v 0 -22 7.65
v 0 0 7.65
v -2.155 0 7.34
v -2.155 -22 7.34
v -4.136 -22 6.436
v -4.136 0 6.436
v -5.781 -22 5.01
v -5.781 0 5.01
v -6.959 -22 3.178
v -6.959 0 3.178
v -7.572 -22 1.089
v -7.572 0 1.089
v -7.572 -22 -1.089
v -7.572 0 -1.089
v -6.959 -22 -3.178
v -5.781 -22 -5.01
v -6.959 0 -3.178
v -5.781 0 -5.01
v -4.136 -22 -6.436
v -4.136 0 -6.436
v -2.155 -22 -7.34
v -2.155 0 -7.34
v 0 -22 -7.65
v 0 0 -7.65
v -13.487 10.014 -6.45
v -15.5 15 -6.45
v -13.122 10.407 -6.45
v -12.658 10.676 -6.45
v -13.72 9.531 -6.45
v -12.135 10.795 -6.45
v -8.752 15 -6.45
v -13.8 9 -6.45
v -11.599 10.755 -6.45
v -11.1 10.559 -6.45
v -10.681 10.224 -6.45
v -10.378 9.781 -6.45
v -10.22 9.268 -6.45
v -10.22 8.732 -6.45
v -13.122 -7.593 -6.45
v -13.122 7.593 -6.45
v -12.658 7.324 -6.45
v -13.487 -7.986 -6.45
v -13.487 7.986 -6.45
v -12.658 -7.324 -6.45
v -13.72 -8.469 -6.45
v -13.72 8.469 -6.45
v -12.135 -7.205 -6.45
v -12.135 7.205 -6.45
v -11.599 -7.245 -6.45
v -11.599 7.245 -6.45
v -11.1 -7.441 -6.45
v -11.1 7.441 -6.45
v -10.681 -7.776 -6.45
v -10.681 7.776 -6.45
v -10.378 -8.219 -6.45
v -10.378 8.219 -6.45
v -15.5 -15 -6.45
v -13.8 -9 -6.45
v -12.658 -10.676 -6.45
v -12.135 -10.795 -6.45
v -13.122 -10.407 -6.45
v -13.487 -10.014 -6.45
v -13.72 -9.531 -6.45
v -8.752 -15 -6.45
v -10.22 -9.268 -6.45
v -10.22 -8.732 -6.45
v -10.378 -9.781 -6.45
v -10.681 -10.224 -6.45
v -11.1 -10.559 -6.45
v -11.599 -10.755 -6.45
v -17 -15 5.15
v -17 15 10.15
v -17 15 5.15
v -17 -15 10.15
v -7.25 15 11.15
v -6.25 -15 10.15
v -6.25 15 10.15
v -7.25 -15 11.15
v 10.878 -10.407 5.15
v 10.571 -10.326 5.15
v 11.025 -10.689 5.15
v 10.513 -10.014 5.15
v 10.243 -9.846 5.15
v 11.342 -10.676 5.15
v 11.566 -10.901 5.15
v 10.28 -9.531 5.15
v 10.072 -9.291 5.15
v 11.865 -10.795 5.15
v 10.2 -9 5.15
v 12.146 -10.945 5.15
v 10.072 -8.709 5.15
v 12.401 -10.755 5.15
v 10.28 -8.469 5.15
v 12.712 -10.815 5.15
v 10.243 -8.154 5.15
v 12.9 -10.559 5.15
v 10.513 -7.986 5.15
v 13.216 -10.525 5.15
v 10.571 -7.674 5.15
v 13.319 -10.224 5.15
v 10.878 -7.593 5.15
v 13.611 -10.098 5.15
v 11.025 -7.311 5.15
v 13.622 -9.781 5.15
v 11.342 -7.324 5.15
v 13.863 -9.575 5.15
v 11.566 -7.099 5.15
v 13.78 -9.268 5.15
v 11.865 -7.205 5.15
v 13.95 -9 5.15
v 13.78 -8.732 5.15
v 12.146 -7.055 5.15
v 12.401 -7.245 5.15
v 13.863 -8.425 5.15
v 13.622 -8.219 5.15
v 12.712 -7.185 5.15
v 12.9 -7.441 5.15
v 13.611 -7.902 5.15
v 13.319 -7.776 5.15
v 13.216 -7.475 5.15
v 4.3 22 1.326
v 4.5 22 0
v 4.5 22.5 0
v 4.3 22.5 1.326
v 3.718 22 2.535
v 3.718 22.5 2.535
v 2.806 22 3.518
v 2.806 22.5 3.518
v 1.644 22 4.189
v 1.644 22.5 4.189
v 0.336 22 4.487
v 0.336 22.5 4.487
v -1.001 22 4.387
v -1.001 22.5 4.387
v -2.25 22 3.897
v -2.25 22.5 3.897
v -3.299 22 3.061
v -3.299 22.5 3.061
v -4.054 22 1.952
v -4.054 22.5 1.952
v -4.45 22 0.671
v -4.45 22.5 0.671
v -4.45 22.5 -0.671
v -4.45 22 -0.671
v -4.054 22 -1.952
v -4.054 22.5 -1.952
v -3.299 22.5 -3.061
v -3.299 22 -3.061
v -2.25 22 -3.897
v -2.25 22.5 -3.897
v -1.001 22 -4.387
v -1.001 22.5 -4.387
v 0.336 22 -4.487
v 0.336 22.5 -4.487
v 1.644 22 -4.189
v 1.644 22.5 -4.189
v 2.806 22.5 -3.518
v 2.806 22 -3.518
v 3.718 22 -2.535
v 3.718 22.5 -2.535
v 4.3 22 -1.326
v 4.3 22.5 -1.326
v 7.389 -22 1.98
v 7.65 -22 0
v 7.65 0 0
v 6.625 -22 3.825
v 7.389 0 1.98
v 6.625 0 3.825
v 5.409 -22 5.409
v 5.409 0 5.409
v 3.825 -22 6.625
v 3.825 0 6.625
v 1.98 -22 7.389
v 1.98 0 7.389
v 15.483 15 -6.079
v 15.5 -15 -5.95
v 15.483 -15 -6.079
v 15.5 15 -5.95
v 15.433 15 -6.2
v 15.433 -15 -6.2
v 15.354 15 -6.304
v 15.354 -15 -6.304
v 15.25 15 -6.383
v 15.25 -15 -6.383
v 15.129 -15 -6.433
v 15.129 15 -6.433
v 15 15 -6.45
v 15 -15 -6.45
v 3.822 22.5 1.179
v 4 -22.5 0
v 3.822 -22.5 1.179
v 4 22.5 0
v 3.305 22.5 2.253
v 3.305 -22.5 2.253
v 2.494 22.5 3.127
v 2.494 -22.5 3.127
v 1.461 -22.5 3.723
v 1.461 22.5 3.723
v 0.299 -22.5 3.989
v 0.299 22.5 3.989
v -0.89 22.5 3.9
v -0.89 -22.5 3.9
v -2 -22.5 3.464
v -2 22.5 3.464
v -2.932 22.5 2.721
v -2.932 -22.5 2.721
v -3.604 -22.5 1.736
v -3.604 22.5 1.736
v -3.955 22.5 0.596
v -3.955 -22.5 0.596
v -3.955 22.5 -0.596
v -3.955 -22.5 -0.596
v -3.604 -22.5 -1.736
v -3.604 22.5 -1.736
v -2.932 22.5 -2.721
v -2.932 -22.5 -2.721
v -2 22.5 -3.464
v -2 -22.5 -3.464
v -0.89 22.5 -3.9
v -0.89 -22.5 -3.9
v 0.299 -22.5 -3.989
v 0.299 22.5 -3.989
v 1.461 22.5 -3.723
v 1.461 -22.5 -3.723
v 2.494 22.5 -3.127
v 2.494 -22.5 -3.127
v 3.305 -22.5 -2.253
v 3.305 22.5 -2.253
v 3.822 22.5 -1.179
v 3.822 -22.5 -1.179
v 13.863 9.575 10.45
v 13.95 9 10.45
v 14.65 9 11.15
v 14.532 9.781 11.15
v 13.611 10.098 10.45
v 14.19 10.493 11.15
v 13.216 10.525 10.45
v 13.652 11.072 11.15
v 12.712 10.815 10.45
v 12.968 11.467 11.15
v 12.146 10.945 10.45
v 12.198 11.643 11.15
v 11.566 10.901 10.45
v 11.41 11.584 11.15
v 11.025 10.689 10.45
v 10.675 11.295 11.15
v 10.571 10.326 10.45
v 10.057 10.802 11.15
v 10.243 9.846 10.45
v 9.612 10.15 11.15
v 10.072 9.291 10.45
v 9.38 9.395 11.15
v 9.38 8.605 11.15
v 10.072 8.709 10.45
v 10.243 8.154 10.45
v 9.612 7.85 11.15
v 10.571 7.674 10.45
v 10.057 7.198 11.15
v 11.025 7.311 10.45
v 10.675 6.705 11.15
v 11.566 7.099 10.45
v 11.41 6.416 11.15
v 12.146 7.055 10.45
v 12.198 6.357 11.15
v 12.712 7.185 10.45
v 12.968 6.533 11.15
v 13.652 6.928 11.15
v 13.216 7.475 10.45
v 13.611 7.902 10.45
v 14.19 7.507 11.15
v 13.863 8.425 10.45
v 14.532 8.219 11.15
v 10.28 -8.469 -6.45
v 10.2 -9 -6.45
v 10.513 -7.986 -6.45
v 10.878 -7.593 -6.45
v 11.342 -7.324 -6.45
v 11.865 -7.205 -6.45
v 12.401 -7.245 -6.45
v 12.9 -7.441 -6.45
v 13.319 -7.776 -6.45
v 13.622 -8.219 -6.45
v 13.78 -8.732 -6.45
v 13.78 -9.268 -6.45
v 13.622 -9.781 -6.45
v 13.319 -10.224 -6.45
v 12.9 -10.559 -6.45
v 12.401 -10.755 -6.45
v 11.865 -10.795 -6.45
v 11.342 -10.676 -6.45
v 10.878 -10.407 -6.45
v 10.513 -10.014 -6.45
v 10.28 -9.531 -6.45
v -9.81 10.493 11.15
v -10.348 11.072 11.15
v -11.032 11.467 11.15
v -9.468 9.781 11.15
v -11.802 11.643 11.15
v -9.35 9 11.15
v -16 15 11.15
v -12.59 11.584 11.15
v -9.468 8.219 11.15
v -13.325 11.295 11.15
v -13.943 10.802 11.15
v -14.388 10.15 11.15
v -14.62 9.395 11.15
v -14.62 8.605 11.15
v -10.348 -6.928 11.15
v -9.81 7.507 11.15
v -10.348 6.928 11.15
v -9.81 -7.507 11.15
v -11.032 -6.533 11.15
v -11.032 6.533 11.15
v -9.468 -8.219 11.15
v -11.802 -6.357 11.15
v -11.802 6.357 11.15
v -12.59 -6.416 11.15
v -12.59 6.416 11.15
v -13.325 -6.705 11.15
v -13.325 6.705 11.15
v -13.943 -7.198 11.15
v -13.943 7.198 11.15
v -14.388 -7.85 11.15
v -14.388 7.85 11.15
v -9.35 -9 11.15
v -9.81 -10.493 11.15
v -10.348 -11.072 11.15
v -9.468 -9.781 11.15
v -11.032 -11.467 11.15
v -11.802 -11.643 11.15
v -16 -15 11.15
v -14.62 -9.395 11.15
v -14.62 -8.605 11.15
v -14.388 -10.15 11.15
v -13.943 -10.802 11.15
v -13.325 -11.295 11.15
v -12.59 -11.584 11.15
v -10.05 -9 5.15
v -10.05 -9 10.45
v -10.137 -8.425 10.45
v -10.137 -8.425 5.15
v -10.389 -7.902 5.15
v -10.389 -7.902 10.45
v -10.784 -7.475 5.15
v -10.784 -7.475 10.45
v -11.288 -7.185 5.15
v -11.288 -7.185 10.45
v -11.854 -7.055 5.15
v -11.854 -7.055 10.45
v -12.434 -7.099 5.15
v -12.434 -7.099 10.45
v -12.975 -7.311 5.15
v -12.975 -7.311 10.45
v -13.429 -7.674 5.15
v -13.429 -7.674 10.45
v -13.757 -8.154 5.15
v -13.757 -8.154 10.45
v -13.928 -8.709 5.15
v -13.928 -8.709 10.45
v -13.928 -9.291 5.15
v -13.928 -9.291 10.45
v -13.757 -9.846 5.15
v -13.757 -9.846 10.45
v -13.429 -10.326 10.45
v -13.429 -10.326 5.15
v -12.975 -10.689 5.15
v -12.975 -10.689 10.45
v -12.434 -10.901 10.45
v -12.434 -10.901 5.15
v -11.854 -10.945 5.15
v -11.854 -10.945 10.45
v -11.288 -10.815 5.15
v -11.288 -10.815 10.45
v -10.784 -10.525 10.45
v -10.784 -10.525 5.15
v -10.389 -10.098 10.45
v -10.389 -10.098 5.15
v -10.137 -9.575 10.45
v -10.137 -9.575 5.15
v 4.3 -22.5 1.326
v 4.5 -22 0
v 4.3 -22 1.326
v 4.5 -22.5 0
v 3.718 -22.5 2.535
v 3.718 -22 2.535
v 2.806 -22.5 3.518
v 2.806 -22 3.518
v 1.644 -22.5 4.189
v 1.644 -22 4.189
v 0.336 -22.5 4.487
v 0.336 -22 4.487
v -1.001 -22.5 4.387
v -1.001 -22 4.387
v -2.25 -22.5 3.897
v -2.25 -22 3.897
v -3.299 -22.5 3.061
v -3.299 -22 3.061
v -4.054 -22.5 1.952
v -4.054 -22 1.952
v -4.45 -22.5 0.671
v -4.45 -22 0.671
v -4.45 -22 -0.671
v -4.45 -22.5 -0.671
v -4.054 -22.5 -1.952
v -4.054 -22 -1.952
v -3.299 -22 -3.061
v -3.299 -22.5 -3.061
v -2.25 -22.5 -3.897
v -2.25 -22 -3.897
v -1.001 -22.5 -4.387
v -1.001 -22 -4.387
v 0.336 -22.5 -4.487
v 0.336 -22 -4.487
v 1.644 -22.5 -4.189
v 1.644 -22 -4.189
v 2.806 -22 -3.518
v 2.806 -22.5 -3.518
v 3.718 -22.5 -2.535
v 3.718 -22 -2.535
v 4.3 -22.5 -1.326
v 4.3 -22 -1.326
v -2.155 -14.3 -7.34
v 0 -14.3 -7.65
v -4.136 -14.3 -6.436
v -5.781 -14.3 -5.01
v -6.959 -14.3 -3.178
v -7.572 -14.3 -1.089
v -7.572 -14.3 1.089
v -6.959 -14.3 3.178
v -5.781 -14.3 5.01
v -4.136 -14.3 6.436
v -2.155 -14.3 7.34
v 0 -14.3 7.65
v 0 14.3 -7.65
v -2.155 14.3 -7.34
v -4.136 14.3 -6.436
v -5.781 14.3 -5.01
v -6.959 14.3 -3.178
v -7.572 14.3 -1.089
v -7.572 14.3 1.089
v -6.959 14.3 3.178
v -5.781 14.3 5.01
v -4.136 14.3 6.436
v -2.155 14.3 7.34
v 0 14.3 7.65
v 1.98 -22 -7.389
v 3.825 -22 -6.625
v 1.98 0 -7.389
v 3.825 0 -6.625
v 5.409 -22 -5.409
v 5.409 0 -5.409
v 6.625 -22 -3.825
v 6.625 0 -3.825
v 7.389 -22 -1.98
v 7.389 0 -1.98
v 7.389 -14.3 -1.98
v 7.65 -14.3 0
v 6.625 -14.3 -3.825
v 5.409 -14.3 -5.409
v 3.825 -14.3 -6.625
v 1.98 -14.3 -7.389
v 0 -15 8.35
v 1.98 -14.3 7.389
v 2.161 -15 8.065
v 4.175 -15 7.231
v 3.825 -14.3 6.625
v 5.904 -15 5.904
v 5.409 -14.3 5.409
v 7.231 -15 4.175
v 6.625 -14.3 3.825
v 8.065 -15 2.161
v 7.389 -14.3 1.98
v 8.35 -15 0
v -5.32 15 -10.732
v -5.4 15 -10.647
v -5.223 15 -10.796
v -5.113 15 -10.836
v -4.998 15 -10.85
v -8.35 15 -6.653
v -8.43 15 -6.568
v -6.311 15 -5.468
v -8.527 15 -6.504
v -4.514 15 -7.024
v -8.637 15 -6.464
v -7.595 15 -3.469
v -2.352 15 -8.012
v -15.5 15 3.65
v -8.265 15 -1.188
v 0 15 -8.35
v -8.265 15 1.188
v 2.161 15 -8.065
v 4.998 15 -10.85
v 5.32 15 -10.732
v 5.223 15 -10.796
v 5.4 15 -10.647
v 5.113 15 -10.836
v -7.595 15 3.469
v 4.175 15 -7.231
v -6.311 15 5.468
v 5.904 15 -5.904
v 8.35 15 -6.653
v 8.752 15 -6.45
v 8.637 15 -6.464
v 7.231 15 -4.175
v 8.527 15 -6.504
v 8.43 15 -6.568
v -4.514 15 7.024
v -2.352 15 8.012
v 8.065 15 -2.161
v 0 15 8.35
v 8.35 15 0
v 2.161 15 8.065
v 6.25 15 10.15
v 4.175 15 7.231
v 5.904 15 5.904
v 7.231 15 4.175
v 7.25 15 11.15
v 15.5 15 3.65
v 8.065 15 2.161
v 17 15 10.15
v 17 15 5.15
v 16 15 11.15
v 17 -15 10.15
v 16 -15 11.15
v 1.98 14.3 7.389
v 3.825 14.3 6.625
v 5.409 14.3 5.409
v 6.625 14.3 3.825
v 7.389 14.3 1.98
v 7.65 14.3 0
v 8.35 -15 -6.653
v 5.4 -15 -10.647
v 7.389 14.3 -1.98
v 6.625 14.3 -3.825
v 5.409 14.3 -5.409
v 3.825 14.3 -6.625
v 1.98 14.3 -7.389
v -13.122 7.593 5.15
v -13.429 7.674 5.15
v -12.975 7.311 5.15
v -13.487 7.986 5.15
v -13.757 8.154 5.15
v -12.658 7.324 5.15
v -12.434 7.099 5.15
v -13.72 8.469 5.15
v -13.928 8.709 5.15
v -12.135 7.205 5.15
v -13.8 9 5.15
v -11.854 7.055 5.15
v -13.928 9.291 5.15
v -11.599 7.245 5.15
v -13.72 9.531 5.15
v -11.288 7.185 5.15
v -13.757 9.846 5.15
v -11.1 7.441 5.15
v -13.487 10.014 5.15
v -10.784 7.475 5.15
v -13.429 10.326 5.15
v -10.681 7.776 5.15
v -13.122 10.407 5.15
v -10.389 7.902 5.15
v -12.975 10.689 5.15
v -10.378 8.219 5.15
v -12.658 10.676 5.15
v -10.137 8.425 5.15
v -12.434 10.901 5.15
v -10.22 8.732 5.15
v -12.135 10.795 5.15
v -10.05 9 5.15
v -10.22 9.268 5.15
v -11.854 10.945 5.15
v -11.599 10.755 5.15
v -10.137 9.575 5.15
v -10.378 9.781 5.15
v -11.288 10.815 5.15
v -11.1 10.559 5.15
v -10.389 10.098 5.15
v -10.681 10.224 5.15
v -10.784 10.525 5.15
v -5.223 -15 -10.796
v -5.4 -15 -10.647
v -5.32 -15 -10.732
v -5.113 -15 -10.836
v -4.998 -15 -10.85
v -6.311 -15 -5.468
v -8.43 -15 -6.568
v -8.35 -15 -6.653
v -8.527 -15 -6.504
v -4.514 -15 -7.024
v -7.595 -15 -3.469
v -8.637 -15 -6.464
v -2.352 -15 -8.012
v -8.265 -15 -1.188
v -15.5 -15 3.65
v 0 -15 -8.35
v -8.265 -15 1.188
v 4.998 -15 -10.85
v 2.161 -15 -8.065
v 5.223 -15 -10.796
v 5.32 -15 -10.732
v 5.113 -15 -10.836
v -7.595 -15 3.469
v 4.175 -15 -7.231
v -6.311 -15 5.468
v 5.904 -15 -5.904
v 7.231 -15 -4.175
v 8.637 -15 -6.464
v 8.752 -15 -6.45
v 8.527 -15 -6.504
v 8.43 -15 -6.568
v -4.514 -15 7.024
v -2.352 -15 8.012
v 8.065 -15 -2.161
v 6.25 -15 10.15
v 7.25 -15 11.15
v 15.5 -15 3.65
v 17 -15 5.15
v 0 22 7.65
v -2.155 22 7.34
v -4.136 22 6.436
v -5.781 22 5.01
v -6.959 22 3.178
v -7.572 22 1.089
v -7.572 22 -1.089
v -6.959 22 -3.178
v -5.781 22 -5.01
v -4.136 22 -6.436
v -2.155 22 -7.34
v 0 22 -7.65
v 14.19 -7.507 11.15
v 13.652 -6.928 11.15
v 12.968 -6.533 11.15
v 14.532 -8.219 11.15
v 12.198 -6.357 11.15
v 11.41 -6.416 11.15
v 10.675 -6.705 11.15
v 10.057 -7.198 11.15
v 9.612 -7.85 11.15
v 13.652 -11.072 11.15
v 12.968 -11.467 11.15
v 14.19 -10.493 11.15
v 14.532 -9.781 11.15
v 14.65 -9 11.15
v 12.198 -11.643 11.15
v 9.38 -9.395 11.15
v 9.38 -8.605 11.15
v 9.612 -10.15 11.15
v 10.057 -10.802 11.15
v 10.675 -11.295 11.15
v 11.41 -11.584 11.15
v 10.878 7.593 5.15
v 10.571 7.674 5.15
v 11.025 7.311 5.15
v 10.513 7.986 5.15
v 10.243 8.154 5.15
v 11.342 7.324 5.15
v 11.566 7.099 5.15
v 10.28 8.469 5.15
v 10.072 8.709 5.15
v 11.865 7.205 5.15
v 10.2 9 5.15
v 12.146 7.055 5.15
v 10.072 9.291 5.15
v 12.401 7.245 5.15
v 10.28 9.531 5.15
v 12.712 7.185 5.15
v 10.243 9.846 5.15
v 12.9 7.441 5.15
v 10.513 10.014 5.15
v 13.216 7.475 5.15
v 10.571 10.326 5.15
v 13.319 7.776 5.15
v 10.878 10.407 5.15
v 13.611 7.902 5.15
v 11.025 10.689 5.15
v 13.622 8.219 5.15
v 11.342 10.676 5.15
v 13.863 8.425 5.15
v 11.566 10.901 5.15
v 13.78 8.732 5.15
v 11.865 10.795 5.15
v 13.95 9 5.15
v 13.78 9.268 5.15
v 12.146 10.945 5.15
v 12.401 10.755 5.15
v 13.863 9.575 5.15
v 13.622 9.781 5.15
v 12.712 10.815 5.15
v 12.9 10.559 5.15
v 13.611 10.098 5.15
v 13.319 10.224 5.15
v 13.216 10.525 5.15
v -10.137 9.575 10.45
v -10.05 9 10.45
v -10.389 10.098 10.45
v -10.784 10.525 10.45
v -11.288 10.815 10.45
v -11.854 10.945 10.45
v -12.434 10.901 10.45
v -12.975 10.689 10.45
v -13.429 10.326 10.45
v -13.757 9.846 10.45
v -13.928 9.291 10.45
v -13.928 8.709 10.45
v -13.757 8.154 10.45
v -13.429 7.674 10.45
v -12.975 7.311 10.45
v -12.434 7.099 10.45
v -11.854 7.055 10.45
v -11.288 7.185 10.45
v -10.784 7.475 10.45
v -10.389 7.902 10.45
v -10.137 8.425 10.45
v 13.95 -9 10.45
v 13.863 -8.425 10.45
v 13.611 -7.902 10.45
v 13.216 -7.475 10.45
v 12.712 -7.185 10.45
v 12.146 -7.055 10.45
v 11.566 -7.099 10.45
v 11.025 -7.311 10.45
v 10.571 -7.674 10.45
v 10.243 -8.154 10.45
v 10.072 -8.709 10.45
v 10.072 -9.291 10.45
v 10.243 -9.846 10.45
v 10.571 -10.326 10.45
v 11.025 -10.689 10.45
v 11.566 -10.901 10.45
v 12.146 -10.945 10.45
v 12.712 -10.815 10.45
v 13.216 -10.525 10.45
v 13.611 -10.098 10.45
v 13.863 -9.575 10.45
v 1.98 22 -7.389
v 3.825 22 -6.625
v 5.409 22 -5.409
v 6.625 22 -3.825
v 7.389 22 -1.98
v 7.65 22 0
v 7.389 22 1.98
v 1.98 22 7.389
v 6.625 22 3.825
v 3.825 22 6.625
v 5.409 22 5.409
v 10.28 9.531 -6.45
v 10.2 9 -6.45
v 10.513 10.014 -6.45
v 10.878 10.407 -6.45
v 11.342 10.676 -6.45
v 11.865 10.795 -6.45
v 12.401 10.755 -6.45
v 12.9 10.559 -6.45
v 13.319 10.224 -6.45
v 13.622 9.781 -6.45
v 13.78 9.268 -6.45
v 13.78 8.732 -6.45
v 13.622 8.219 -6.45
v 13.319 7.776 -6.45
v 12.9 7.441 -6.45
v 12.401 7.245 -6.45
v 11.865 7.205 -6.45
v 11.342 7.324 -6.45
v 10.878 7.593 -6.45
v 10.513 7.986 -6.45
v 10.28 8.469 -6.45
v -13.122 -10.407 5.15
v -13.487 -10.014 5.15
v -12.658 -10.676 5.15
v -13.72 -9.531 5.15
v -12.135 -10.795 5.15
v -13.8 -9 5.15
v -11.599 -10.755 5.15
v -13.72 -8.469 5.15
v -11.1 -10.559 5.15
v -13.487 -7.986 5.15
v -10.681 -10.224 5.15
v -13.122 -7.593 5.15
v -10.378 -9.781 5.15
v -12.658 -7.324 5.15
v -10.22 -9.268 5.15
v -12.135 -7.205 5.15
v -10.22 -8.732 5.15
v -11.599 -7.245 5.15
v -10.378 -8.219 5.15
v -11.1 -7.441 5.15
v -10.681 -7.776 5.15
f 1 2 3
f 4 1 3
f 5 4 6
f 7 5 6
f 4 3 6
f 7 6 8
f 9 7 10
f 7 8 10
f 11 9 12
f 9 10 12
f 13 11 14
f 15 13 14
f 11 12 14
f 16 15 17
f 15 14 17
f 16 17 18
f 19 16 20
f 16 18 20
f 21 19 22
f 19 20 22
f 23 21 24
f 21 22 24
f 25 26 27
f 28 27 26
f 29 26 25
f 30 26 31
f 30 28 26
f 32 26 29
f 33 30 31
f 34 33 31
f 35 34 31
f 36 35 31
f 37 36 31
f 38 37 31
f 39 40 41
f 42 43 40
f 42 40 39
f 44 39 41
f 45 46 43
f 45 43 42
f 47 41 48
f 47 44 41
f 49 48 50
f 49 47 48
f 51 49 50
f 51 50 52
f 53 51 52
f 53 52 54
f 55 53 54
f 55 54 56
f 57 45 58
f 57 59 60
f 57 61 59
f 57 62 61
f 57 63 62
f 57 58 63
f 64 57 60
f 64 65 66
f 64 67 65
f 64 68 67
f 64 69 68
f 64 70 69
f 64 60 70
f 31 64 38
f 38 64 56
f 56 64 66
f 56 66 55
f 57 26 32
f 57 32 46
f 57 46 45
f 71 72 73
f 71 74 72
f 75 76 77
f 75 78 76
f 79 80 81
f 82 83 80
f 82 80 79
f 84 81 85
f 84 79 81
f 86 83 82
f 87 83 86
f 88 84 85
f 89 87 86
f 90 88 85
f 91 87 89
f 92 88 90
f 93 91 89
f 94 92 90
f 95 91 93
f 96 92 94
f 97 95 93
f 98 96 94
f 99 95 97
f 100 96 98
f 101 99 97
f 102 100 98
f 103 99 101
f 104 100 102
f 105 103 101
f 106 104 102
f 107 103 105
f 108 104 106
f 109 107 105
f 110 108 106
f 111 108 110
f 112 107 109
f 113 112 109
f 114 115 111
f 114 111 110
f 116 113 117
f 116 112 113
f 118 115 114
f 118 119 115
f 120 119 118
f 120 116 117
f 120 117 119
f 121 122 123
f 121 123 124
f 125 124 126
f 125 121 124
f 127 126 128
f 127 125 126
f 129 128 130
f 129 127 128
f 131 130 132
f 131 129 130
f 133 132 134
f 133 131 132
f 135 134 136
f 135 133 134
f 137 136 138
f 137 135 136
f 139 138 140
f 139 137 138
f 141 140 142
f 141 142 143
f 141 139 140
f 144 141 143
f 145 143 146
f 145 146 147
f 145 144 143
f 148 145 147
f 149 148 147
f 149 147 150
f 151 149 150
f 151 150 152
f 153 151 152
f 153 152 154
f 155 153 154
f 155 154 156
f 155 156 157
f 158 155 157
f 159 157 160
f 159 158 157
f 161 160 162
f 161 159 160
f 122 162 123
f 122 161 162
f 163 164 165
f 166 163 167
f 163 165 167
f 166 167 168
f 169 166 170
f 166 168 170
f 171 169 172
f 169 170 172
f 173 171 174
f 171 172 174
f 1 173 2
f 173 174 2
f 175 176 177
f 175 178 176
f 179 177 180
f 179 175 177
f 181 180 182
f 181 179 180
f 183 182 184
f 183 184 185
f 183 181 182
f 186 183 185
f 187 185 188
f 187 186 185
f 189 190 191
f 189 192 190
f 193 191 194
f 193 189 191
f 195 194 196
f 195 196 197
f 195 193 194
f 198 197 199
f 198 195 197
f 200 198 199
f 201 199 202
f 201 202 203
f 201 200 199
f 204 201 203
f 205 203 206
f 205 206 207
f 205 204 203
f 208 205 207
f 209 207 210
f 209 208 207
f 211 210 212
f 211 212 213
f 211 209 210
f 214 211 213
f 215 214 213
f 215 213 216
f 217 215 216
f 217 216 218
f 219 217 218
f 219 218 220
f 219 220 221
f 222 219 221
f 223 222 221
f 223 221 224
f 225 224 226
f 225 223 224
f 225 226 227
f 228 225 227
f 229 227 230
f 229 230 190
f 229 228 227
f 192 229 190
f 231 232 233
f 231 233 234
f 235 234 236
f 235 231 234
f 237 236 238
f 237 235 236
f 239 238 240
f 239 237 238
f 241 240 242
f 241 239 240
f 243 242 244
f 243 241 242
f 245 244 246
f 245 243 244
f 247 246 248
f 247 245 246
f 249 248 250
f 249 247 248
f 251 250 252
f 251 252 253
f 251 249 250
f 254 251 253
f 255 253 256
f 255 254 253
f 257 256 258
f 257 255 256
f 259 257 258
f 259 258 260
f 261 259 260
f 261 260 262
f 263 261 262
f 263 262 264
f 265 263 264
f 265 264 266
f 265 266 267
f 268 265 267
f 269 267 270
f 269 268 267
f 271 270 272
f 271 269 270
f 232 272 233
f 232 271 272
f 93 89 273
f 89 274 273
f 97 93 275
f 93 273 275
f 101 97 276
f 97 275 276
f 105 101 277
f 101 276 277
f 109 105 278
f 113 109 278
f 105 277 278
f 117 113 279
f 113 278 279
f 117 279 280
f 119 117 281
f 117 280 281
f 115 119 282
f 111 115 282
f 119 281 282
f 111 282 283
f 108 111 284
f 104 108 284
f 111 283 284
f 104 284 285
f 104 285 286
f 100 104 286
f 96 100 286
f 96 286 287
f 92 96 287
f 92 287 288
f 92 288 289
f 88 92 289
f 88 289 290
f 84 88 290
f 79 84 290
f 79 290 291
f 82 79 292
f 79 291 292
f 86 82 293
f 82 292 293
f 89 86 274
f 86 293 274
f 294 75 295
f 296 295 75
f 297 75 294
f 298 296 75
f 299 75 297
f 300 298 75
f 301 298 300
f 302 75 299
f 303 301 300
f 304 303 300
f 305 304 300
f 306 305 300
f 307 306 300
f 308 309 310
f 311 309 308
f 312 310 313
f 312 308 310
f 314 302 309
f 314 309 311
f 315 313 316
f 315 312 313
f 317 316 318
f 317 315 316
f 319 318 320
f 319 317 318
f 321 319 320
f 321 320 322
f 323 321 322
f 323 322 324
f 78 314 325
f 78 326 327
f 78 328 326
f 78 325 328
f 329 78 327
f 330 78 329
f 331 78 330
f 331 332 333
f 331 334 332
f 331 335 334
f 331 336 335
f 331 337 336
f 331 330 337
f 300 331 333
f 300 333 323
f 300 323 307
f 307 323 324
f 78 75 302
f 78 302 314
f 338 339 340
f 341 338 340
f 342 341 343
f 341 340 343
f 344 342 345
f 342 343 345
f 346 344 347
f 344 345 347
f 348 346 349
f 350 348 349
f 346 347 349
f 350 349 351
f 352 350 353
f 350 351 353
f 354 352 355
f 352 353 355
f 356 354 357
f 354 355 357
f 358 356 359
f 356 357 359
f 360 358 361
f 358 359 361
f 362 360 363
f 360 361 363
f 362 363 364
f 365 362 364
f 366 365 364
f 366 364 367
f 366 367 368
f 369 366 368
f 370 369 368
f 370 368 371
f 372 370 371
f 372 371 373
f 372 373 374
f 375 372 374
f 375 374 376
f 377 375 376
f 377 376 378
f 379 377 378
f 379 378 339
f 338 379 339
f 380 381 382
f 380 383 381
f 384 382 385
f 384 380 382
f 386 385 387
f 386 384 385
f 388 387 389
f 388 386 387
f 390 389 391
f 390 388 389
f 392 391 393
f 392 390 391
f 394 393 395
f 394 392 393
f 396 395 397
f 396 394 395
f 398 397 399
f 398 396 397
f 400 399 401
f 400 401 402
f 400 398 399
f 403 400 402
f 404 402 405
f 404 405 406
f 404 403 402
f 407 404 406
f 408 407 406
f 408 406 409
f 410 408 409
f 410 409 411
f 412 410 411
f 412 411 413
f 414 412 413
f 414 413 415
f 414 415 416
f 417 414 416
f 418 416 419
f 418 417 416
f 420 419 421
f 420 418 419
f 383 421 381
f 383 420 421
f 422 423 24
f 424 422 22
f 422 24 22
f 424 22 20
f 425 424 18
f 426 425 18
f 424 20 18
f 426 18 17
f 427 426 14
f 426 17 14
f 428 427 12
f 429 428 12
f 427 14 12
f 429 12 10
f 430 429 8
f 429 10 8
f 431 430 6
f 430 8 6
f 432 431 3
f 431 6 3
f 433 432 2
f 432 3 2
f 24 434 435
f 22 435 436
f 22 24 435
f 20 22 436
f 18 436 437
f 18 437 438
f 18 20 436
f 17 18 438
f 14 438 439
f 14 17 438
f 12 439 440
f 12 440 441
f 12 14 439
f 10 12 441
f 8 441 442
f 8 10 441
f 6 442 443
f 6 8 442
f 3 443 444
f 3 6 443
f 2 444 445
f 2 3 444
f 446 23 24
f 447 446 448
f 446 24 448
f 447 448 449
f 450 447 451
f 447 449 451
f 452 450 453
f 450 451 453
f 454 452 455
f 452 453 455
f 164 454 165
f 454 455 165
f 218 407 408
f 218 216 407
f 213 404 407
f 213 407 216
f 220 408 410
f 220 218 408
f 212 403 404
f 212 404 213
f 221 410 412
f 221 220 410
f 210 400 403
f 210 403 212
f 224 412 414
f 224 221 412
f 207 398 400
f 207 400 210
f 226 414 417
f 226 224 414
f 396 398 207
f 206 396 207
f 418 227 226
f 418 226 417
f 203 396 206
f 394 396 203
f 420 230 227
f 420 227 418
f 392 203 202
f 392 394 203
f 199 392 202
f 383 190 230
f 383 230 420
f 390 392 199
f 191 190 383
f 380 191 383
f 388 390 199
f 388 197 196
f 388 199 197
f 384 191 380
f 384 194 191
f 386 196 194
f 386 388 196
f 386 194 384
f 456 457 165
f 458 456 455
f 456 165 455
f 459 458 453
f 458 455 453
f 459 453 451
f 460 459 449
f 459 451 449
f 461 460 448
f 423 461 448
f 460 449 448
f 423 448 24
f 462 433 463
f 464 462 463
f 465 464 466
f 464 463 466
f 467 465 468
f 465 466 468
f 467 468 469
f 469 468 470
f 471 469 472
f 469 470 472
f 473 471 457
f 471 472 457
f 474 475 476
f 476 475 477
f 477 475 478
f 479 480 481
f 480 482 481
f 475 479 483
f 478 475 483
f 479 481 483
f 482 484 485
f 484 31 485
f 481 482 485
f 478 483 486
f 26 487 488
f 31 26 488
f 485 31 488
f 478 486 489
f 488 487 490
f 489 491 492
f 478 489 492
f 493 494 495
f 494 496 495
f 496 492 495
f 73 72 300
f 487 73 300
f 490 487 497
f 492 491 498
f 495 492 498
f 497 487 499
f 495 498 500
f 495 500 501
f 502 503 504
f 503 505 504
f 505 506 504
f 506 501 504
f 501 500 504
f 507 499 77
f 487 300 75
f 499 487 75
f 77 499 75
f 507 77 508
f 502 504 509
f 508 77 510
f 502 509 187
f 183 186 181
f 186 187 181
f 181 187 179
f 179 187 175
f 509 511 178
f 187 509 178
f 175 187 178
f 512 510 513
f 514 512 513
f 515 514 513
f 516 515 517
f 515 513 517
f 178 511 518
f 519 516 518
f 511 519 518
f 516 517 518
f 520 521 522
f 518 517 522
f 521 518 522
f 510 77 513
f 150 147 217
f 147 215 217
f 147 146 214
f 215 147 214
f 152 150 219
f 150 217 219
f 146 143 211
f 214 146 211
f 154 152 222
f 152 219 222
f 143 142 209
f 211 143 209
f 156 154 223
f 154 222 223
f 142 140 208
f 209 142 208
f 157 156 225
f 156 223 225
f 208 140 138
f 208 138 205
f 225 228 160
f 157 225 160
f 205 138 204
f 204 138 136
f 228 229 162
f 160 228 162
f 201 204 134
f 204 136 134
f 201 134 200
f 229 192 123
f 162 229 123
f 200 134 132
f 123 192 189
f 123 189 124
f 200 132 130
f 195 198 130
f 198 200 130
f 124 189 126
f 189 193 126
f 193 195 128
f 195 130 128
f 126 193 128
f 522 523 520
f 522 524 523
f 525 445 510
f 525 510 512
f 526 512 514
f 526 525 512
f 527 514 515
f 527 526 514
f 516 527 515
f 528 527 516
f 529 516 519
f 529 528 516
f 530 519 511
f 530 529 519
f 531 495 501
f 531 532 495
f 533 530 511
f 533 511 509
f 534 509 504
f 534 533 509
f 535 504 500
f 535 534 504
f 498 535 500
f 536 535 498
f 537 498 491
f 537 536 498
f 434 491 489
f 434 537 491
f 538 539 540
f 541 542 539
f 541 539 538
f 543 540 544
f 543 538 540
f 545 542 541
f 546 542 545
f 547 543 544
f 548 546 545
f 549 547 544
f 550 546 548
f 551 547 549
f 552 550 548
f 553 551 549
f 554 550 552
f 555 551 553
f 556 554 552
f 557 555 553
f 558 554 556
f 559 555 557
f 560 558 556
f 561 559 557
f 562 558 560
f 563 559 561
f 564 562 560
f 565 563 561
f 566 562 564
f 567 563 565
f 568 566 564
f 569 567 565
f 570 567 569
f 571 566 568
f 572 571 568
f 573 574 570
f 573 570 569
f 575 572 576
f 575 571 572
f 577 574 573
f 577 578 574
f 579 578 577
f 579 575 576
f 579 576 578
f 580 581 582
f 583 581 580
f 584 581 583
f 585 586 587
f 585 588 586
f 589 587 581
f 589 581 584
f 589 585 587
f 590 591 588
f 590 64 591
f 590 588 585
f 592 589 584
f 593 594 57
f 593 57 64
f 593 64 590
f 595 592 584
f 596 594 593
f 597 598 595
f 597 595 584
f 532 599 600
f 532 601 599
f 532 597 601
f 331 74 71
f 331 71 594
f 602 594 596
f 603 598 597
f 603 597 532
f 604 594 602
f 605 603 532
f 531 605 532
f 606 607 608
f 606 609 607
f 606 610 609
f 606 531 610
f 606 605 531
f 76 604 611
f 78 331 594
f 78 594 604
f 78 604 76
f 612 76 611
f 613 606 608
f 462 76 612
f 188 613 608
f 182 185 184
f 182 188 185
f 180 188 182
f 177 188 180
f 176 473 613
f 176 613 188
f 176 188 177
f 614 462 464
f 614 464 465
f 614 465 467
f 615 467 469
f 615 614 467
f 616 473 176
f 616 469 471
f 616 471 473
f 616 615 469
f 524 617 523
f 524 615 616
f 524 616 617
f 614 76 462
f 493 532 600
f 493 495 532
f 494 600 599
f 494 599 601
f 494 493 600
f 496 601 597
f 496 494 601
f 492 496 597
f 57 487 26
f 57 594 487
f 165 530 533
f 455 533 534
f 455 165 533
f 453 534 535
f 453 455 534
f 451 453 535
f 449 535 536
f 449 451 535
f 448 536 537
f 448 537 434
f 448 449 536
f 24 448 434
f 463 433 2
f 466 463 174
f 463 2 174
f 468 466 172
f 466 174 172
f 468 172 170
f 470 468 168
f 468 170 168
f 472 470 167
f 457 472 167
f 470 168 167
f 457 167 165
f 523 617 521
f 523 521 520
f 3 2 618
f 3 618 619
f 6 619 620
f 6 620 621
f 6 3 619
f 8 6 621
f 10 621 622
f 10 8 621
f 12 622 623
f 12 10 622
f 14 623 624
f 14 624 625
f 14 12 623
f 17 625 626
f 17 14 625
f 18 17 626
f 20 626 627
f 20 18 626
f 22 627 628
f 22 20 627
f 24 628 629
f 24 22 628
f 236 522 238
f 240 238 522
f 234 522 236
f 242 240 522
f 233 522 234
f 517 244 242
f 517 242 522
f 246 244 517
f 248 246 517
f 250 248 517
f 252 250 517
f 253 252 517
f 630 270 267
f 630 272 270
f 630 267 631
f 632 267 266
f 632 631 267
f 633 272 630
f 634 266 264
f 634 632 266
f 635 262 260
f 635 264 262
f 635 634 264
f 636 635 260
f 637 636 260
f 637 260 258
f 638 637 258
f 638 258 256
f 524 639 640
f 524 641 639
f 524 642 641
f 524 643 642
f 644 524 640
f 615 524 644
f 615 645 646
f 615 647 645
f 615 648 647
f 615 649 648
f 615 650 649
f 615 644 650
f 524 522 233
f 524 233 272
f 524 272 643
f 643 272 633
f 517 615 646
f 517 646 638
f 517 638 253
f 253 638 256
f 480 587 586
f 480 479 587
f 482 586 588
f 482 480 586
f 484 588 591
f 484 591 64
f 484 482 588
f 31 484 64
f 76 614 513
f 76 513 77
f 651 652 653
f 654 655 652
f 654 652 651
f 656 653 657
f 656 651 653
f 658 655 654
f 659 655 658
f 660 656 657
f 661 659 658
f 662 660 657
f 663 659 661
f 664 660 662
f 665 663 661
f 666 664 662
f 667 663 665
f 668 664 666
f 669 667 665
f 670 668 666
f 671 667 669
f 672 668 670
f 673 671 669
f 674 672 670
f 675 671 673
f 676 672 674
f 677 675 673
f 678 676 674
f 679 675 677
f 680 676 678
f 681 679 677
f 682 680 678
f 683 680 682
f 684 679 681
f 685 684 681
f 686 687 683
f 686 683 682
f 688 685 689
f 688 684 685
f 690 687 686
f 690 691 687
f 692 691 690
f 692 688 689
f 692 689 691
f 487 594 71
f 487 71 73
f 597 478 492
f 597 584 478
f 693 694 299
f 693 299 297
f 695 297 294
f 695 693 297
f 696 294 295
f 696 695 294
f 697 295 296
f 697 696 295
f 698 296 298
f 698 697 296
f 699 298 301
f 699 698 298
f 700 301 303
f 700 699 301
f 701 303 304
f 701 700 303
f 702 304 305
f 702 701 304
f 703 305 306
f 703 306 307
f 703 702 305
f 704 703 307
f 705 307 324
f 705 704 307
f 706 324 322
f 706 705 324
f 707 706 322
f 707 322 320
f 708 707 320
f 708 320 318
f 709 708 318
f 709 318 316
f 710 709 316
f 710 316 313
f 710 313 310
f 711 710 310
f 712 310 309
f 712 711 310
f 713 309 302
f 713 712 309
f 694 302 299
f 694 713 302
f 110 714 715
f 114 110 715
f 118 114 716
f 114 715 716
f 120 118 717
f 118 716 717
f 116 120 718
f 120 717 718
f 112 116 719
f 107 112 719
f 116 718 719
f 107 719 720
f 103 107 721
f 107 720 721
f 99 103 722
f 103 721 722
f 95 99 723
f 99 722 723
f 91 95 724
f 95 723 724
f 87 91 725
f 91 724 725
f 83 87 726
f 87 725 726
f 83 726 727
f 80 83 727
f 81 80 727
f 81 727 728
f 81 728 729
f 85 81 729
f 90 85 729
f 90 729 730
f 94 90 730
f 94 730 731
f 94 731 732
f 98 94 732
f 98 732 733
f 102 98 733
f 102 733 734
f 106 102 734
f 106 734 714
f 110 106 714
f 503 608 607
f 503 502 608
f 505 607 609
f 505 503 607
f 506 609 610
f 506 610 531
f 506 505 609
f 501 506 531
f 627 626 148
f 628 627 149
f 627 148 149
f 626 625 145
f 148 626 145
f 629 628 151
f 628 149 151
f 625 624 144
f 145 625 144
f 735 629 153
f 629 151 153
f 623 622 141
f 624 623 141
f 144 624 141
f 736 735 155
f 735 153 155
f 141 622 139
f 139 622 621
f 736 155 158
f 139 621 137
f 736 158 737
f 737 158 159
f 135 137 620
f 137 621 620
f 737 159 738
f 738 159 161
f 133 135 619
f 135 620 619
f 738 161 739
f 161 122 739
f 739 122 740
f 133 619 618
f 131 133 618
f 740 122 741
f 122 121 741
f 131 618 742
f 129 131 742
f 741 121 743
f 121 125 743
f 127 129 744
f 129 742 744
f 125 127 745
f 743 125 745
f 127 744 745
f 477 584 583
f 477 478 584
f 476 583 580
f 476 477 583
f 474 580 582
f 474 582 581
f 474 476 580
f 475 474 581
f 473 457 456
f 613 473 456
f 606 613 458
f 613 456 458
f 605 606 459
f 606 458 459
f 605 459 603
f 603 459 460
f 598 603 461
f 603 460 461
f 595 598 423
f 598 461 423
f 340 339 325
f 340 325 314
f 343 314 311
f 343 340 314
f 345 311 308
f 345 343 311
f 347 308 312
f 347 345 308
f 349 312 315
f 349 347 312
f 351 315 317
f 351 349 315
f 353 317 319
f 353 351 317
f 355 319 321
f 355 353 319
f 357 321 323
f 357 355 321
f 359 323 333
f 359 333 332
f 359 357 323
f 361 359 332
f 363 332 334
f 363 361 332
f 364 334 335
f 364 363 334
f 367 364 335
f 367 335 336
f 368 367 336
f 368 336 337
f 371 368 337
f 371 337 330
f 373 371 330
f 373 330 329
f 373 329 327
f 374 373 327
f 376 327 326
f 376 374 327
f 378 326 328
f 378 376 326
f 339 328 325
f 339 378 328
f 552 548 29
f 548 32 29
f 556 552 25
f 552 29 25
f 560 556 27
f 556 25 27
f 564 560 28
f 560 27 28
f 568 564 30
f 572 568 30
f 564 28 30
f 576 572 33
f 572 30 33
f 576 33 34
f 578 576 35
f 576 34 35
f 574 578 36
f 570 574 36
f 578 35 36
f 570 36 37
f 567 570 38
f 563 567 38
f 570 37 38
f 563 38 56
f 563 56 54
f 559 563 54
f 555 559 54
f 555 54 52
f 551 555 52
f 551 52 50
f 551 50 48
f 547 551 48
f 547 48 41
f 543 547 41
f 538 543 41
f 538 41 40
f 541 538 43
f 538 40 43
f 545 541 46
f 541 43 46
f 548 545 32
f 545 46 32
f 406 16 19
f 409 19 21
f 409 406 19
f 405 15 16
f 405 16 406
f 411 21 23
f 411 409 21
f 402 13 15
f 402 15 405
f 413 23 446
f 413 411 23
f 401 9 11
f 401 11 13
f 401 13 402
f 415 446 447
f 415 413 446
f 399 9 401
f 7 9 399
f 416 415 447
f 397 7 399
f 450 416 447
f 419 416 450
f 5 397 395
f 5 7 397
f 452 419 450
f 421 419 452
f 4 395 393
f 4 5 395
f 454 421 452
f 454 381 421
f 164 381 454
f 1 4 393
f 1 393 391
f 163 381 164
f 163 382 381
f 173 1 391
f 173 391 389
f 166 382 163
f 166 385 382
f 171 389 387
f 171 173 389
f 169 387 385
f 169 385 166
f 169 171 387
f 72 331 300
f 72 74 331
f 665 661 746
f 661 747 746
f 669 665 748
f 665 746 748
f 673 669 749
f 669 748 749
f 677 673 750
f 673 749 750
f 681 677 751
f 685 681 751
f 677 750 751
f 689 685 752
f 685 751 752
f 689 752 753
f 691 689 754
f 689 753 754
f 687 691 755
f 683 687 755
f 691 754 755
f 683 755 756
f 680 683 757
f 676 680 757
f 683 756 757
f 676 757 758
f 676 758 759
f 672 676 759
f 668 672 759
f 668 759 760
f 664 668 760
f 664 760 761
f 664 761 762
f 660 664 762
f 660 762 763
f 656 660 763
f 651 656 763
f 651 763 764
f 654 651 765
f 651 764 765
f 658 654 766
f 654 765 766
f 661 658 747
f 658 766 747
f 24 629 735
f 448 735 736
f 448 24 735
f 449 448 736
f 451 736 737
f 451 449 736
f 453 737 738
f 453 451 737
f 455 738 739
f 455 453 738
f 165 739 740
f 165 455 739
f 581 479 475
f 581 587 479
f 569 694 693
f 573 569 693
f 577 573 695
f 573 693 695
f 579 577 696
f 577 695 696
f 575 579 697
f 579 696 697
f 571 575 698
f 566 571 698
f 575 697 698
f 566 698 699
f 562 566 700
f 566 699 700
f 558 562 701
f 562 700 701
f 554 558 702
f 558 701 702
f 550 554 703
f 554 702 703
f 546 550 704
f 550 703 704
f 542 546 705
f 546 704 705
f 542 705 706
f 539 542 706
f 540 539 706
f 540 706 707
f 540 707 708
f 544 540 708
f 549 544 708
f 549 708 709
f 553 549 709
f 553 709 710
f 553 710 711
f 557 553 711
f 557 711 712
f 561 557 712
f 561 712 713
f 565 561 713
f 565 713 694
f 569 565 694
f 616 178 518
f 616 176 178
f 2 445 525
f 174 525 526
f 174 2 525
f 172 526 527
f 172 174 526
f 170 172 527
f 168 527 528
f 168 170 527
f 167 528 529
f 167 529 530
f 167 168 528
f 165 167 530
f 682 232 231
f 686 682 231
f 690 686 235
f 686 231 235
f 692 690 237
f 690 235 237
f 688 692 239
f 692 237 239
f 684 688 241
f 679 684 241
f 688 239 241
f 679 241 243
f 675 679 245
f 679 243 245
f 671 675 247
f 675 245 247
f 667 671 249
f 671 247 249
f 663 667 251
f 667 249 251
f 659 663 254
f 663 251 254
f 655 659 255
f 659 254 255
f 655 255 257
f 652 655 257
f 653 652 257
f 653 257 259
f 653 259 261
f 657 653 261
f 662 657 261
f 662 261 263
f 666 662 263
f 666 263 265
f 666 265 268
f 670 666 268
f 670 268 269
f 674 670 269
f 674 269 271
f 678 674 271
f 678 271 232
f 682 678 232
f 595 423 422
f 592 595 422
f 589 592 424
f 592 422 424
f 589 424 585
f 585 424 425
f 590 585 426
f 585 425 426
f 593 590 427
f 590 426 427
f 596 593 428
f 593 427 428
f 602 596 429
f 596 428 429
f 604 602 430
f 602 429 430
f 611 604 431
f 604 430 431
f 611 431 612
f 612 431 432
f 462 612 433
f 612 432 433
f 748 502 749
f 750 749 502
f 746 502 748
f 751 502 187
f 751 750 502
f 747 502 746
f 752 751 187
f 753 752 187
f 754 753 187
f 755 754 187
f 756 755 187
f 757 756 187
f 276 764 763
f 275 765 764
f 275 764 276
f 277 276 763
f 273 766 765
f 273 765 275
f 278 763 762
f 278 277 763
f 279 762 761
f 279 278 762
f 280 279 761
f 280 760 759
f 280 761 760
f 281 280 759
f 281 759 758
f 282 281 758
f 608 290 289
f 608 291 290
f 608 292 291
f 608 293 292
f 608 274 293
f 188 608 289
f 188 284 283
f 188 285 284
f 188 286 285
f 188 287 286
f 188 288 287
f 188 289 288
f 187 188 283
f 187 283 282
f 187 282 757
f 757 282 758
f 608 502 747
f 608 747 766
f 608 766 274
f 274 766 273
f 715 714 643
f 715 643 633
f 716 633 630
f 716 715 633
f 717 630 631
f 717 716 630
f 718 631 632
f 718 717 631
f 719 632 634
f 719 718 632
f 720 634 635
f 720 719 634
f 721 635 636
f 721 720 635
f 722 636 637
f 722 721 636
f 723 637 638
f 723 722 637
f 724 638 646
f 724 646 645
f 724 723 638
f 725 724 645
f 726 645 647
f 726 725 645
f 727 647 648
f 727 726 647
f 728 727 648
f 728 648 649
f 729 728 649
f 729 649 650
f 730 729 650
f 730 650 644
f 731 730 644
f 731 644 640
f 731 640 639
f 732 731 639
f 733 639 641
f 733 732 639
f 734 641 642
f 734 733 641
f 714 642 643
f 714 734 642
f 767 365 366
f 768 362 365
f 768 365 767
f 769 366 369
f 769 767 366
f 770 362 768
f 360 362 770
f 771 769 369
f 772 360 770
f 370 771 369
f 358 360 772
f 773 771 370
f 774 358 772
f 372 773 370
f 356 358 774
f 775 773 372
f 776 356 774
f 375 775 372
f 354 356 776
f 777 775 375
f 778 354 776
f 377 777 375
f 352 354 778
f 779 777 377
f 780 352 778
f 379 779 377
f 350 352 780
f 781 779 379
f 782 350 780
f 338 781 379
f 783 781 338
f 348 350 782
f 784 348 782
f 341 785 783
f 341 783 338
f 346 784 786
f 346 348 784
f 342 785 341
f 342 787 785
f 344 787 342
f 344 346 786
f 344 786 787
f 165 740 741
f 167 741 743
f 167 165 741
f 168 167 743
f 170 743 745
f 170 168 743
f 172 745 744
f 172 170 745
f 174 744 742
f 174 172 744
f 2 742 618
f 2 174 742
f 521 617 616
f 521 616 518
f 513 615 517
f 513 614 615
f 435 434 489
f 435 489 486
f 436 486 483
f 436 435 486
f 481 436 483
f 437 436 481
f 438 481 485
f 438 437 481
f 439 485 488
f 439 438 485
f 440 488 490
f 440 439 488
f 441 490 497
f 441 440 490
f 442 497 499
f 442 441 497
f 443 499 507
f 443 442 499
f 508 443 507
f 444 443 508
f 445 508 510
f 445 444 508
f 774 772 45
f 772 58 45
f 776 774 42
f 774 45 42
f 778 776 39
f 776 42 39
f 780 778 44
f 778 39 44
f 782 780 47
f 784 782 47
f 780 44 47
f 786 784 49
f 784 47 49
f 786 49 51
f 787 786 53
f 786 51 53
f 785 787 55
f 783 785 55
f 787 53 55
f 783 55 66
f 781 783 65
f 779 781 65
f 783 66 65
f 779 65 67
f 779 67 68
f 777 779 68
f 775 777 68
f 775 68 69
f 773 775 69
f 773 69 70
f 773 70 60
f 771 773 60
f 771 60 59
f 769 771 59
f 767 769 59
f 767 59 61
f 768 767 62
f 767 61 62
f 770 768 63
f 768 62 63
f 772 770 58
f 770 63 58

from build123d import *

# Parameters (mm, degrees)
F1_DEPTH       = 15
F2_SIZE        = 0.99999
F3_SIZE        = 1.49999
F4_R           = 0.5
F6_D           = 3.6
F6_CBORE_D     = 3.9
F6_CBORE_DEPTH = 6
F7_SIZE        = 0.7
F0_R           = 4.5
F8_DEPTH       = 22
F0_R_2         = 4
F9_DEPTH       = 22.5


# Not quite as in the source:
# - a fillet or chamfer is up to 0.001 mm smaller than in the source, because OpenCascade refuses the exact size


with BuildPart() as f1:
    # F0 (on Front) → F1 (new body, symmetric)
    with BuildSketch(Plane.XZ):
        with BuildLine():
            ThreePointArc((0, 7.65), (5.4093668761, 5.4093668761), (7.65, 0))
            ThreePointArc((7.65, 0), (5.4093668761, -5.4093668761), (0, -7.65))
            Line((0, -7.65), (0, -10.85))
            Line((0, -10.85), (5.25, -10.85))
            Line((5.25, -10.85), (8.5, -6.45))
            Line((8.5, -6.45), (15.5, -6.45))
            Line((15.5, -6.45), (15.5, 3.65))
            Line((15.5, 3.65), (17, 3.65))
            Line((17, 3.65), (17, 11.15))
            Line((17, 11.15), (7.25, 11.15))
            Line((7.25, 11.15), (7.25, 10.15))
            Line((7.25, 10.15), (0, 10.15))
            Line((0, 10.15), (0, 7.65))
        make_face()
        with BuildLine():
            ThreePointArc((0, -7.65), (-7.65, 0), (0, 7.65))
            Line((0, 7.65), (0, 10.15))
            Line((0, 10.15), (-7.25, 10.15))
            Line((-7.25, 10.15), (-7.25, 11.15))
            Line((-7.25, 11.15), (-17, 11.15))
            Line((-17, 11.15), (-17, 3.65))
            Line((-17, 3.65), (-15.5, 3.65))
            Line((-15.5, 3.65), (-15.5, -6.45))
            Line((-15.5, -6.45), (-8.5, -6.45))
            Line((-8.5, -6.45), (-5.25, -10.85))
            Line((-5.25, -10.85), (0, -10.85))
            Line((0, -10.85), (0, -7.65))
        make_face()
    extrude(amount=F1_DEPTH, both=True)

    # F2 (size 1 in the source; OpenCascade refuses exactly that, so slightly less here)
    f2_edges = [f1.edges().sort_by_distance(p)[0] for p in [
        (7.25, 0, 10.15),
        (17, 0, 11.15),
        (-7.25, 0, 10.15),
        (-17, 0, 11.15),
    ]]
    chamfer(f2_edges, length=F2_SIZE)

    # F3 (size 1.5 in the source; OpenCascade refuses exactly that, so slightly less here)
    f3_edges = [f1.edges().sort_by_distance(p)[0] for p in [
        (17, 0, 3.65),
        (-17, 0, 3.65),
    ]]
    chamfer(f3_edges, length=F3_SIZE)

    # F4
    f4_edges = [f1.edges().sort_by_distance(p)[0] for p in [
        (15.5, 0, -6.45),
        (8.5, 0, -6.45),
        (5.25, 0, -10.85),
        (-5.25, 0, -10.85),
        (-8.5, 0, -6.45),
    ]]
    fillet(f4_edges, radius=F4_R)

    # F6 (through all)
    with Locations(Plane.XY.offset(11.15)):
        with Locations((12, 9), (12, -9), (-12, 9), (-12, -9)):
            CounterBoreHole(F6_D / 2, F6_CBORE_D / 2, F6_CBORE_DEPTH)

    # F7
    f7_edges = [f1.edges().sort_by_distance(p)[0] for p in [
        (-7.65, -15, 0),
        (-7.65, 15, 0),
        (10.05, 9, 11.15),
        (10.05, -9, 11.15),
        (-13.95, 9, 11.15),
        (-13.95, -9, 11.15),
    ]]
    chamfer(f7_edges, length=F7_SIZE)


with BuildPart() as f8:
    # F0 (on Front) → F8 (new body, symmetric)
    with BuildSketch(Plane.XZ):
        with BuildLine():
            ThreePointArc((0, -7.65), (5.4093668761, -5.4093668761), (7.65, 0))
            ThreePointArc((7.65, 0), (5.4093668761, 5.4093668761), (0, 7.65))
            ThreePointArc((0, 7.65), (-7.65, 0), (0, -7.65))
        make_face()
        Circle(F0_R, mode=Mode.SUBTRACT)
    extrude(amount=F8_DEPTH, both=True)

    # F0 (on Front) → F9 (join, symmetric)
    with BuildSketch(Plane.XZ):
        Circle(F0_R)
        Circle(F0_R_2, mode=Mode.SUBTRACT)
    extrude(amount=F9_DEPTH, both=True)


solid = Compound([f1.part, f8.part])
